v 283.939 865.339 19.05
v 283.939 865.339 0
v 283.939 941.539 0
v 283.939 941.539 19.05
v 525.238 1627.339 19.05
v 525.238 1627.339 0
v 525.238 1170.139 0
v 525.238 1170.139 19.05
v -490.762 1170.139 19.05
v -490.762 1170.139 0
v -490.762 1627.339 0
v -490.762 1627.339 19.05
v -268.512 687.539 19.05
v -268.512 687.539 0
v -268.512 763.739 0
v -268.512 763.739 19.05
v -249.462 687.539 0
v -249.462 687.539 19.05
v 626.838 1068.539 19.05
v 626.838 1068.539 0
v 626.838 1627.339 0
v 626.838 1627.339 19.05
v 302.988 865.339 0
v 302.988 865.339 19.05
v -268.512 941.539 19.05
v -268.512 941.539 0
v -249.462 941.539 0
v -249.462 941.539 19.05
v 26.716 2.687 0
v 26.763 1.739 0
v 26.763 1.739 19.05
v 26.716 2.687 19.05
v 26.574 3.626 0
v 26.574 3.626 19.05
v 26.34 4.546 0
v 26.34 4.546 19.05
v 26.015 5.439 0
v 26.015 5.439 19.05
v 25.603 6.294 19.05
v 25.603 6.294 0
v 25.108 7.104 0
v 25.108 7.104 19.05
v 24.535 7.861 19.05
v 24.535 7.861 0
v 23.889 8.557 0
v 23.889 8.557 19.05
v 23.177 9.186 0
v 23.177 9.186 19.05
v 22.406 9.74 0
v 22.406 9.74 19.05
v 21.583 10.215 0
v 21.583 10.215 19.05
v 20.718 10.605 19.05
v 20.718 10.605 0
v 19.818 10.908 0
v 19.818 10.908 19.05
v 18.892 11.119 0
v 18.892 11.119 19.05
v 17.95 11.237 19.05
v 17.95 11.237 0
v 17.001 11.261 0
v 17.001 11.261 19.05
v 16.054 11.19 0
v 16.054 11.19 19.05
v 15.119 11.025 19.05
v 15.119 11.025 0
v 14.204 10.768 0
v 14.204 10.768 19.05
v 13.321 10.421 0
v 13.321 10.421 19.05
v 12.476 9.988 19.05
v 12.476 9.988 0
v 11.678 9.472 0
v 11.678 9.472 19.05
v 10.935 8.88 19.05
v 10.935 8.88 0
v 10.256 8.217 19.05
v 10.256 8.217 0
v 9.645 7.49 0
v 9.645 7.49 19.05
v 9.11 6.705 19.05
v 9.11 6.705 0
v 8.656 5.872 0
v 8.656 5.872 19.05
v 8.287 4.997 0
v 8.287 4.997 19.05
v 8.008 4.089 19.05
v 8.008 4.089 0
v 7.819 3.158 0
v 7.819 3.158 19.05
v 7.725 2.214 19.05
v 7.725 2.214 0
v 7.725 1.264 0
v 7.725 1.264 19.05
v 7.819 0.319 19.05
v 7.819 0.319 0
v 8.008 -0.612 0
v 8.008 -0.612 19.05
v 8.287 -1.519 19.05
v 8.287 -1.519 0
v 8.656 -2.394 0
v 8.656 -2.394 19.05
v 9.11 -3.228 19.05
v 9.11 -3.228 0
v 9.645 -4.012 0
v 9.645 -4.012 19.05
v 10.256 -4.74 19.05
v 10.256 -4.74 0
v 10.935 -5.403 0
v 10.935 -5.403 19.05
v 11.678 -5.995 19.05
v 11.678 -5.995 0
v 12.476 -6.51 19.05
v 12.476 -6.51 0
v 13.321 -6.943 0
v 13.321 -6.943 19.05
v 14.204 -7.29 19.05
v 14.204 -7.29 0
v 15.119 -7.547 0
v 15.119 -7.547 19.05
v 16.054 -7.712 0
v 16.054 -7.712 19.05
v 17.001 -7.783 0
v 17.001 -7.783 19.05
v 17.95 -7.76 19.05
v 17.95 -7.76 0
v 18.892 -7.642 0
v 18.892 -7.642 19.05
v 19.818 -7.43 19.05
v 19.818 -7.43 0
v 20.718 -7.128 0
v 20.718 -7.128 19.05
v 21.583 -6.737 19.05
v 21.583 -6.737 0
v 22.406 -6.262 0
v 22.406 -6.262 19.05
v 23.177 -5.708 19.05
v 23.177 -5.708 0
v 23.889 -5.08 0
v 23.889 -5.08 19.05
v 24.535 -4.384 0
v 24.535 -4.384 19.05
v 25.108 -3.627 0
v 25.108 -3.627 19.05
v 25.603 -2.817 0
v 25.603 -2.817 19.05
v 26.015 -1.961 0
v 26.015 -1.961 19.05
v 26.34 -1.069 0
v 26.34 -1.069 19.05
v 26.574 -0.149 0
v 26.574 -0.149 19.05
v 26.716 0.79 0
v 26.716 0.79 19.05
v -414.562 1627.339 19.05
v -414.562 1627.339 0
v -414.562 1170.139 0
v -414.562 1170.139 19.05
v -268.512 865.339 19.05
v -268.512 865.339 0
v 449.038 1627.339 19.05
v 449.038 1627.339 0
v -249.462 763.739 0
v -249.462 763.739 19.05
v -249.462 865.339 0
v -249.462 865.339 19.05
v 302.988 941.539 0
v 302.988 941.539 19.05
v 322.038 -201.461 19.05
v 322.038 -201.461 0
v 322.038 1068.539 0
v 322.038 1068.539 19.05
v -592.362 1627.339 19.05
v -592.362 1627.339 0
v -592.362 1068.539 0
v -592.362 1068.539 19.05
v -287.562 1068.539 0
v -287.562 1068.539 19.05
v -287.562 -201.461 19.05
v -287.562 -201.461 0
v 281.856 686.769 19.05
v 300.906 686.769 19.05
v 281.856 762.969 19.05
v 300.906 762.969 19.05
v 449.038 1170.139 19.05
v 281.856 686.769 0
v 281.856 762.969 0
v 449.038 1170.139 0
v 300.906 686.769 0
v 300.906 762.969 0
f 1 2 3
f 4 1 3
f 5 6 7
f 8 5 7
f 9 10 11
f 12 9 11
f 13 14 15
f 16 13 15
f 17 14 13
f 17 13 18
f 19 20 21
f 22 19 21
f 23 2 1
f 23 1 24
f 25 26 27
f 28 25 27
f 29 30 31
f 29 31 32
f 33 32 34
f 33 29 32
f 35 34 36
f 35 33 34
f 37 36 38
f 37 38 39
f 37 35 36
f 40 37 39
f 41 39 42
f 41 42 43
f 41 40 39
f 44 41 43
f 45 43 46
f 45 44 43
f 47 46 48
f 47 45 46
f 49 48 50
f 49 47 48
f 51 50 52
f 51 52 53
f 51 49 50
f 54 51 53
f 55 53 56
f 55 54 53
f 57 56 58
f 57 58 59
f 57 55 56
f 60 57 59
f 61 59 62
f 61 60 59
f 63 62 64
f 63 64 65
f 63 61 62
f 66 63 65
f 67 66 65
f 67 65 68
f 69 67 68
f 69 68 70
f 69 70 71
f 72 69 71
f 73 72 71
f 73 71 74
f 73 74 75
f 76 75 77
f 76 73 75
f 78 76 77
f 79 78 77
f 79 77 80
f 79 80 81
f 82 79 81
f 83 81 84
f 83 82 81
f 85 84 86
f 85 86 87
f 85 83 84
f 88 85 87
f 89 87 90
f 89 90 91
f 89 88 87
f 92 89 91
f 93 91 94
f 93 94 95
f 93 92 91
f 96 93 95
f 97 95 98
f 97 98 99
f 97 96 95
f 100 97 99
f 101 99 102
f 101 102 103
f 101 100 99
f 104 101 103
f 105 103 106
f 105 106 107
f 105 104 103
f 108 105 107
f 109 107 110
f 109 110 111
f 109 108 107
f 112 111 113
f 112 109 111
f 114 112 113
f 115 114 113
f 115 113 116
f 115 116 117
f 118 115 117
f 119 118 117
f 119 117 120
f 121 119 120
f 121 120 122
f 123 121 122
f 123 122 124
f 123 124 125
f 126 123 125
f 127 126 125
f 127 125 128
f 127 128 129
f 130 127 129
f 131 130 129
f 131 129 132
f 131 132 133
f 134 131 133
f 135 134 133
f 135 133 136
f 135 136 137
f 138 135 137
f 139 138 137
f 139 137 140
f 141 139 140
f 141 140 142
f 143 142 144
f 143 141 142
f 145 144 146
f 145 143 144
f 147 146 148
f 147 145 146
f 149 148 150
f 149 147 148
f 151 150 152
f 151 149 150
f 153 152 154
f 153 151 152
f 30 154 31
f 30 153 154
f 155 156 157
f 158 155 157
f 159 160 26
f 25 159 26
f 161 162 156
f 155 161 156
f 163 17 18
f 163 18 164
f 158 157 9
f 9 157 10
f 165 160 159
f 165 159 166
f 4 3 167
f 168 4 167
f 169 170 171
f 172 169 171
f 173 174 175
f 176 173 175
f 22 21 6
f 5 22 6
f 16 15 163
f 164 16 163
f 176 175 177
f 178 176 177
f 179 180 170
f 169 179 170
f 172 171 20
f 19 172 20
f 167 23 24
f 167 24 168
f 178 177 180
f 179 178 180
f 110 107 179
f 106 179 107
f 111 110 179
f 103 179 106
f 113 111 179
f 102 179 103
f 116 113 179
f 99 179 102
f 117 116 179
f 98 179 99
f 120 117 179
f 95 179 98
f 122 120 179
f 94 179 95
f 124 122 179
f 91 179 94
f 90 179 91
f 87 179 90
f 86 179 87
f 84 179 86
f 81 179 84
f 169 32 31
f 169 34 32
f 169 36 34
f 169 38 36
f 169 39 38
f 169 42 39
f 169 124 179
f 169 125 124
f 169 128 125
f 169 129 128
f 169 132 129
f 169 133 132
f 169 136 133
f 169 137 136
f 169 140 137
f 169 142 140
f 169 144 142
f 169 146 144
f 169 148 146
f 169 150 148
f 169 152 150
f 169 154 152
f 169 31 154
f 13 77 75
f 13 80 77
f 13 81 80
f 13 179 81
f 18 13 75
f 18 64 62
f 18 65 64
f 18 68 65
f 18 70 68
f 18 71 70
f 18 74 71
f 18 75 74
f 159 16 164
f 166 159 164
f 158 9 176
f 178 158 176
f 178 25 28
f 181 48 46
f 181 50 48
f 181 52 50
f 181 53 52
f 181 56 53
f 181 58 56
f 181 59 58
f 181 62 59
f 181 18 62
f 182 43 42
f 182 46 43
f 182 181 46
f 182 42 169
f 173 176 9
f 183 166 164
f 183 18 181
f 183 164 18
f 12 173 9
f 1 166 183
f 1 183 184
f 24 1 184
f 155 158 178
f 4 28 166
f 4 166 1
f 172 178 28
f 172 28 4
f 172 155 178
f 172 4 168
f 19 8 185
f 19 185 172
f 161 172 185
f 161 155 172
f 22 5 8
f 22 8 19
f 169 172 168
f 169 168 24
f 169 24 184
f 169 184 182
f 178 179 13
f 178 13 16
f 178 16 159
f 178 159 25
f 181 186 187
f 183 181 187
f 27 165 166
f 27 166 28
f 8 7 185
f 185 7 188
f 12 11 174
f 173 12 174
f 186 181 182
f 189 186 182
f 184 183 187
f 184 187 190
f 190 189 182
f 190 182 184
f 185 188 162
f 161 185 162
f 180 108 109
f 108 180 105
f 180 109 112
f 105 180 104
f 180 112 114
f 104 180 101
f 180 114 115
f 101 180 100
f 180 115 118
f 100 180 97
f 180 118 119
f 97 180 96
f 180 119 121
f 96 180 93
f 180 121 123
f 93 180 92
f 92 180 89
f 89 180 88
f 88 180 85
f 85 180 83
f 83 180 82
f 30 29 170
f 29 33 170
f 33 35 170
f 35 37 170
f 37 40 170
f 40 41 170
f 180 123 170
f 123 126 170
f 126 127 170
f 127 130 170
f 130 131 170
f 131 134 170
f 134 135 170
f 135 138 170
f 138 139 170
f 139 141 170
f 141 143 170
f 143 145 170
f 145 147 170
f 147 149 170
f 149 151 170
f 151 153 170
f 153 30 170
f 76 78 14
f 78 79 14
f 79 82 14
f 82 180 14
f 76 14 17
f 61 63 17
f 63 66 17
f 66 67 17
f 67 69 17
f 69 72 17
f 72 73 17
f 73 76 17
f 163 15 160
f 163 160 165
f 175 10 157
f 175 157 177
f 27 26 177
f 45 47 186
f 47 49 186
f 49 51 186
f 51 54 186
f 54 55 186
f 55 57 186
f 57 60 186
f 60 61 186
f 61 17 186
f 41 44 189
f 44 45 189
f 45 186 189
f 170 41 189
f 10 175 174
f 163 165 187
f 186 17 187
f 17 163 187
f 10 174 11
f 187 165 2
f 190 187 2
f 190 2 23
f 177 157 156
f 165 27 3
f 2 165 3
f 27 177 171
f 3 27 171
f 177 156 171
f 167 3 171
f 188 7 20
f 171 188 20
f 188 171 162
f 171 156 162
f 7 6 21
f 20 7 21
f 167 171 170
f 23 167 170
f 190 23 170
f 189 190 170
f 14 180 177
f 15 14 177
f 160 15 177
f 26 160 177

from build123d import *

# Parameters (mm, degrees)
F0_R     = 9.525
F0_W     = 19.05
F0_H     = 76.2
F0_W_2   = 19.048609
F1_DEPTH = 19.05


with BuildPart() as f1:
    # F0 (on Top) → F1 (new body)
    with BuildSketch(Plane.XY):
        Polygon((-287.56197, 204.938772), (-287.56197, -201.461228), (17.23803, -201.461228), (322.03803, -201.461228), (322.03803, 204.938772), (322.03803, 865.338772), (322.03803, 941.538772), (322.03803, 1068.538772), (626.83803, 1068.538772), (626.83803, 1627.338772), (525.23803, 1627.338772), (525.23803, 1170.138772), (449.03803, 1170.138772), (449.03803, 1627.338772), (-414.56197, 1627.338772), (-414.56197, 1170.138772), (-490.76197, 1170.138772), (-490.76197, 1627.338772), (-592.36197, 1627.338772), (-592.36197, 1068.538772), (-287.56197, 1068.538772), (-287.56197, 941.538772), (-287.56197, 865.338772), (-287.56197, 763.738772), (-287.56197, 687.538772), (-287.56197, 560.538772), align=None)
        with Locations((17.23803, 1.738772)):
            Circle(F0_R, mode=Mode.SUBTRACT)
        with Locations((-258.98697, 725.638772)):
            Rectangle(F0_W, F0_H, mode=Mode.SUBTRACT)
        with Locations((-258.98697, 903.438772)):
            Rectangle(F0_W, F0_H, mode=Mode.SUBTRACT)
        with Locations((291.380524, 724.869366)):
            Rectangle(F0_W, F0_H, mode=Mode.SUBTRACT)
        with Locations((293.463726, 903.438772)):
            Rectangle(F0_W_2, F0_H, mode=Mode.SUBTRACT)
    extrude(amount=F1_DEPTH)


solid = f1.part
